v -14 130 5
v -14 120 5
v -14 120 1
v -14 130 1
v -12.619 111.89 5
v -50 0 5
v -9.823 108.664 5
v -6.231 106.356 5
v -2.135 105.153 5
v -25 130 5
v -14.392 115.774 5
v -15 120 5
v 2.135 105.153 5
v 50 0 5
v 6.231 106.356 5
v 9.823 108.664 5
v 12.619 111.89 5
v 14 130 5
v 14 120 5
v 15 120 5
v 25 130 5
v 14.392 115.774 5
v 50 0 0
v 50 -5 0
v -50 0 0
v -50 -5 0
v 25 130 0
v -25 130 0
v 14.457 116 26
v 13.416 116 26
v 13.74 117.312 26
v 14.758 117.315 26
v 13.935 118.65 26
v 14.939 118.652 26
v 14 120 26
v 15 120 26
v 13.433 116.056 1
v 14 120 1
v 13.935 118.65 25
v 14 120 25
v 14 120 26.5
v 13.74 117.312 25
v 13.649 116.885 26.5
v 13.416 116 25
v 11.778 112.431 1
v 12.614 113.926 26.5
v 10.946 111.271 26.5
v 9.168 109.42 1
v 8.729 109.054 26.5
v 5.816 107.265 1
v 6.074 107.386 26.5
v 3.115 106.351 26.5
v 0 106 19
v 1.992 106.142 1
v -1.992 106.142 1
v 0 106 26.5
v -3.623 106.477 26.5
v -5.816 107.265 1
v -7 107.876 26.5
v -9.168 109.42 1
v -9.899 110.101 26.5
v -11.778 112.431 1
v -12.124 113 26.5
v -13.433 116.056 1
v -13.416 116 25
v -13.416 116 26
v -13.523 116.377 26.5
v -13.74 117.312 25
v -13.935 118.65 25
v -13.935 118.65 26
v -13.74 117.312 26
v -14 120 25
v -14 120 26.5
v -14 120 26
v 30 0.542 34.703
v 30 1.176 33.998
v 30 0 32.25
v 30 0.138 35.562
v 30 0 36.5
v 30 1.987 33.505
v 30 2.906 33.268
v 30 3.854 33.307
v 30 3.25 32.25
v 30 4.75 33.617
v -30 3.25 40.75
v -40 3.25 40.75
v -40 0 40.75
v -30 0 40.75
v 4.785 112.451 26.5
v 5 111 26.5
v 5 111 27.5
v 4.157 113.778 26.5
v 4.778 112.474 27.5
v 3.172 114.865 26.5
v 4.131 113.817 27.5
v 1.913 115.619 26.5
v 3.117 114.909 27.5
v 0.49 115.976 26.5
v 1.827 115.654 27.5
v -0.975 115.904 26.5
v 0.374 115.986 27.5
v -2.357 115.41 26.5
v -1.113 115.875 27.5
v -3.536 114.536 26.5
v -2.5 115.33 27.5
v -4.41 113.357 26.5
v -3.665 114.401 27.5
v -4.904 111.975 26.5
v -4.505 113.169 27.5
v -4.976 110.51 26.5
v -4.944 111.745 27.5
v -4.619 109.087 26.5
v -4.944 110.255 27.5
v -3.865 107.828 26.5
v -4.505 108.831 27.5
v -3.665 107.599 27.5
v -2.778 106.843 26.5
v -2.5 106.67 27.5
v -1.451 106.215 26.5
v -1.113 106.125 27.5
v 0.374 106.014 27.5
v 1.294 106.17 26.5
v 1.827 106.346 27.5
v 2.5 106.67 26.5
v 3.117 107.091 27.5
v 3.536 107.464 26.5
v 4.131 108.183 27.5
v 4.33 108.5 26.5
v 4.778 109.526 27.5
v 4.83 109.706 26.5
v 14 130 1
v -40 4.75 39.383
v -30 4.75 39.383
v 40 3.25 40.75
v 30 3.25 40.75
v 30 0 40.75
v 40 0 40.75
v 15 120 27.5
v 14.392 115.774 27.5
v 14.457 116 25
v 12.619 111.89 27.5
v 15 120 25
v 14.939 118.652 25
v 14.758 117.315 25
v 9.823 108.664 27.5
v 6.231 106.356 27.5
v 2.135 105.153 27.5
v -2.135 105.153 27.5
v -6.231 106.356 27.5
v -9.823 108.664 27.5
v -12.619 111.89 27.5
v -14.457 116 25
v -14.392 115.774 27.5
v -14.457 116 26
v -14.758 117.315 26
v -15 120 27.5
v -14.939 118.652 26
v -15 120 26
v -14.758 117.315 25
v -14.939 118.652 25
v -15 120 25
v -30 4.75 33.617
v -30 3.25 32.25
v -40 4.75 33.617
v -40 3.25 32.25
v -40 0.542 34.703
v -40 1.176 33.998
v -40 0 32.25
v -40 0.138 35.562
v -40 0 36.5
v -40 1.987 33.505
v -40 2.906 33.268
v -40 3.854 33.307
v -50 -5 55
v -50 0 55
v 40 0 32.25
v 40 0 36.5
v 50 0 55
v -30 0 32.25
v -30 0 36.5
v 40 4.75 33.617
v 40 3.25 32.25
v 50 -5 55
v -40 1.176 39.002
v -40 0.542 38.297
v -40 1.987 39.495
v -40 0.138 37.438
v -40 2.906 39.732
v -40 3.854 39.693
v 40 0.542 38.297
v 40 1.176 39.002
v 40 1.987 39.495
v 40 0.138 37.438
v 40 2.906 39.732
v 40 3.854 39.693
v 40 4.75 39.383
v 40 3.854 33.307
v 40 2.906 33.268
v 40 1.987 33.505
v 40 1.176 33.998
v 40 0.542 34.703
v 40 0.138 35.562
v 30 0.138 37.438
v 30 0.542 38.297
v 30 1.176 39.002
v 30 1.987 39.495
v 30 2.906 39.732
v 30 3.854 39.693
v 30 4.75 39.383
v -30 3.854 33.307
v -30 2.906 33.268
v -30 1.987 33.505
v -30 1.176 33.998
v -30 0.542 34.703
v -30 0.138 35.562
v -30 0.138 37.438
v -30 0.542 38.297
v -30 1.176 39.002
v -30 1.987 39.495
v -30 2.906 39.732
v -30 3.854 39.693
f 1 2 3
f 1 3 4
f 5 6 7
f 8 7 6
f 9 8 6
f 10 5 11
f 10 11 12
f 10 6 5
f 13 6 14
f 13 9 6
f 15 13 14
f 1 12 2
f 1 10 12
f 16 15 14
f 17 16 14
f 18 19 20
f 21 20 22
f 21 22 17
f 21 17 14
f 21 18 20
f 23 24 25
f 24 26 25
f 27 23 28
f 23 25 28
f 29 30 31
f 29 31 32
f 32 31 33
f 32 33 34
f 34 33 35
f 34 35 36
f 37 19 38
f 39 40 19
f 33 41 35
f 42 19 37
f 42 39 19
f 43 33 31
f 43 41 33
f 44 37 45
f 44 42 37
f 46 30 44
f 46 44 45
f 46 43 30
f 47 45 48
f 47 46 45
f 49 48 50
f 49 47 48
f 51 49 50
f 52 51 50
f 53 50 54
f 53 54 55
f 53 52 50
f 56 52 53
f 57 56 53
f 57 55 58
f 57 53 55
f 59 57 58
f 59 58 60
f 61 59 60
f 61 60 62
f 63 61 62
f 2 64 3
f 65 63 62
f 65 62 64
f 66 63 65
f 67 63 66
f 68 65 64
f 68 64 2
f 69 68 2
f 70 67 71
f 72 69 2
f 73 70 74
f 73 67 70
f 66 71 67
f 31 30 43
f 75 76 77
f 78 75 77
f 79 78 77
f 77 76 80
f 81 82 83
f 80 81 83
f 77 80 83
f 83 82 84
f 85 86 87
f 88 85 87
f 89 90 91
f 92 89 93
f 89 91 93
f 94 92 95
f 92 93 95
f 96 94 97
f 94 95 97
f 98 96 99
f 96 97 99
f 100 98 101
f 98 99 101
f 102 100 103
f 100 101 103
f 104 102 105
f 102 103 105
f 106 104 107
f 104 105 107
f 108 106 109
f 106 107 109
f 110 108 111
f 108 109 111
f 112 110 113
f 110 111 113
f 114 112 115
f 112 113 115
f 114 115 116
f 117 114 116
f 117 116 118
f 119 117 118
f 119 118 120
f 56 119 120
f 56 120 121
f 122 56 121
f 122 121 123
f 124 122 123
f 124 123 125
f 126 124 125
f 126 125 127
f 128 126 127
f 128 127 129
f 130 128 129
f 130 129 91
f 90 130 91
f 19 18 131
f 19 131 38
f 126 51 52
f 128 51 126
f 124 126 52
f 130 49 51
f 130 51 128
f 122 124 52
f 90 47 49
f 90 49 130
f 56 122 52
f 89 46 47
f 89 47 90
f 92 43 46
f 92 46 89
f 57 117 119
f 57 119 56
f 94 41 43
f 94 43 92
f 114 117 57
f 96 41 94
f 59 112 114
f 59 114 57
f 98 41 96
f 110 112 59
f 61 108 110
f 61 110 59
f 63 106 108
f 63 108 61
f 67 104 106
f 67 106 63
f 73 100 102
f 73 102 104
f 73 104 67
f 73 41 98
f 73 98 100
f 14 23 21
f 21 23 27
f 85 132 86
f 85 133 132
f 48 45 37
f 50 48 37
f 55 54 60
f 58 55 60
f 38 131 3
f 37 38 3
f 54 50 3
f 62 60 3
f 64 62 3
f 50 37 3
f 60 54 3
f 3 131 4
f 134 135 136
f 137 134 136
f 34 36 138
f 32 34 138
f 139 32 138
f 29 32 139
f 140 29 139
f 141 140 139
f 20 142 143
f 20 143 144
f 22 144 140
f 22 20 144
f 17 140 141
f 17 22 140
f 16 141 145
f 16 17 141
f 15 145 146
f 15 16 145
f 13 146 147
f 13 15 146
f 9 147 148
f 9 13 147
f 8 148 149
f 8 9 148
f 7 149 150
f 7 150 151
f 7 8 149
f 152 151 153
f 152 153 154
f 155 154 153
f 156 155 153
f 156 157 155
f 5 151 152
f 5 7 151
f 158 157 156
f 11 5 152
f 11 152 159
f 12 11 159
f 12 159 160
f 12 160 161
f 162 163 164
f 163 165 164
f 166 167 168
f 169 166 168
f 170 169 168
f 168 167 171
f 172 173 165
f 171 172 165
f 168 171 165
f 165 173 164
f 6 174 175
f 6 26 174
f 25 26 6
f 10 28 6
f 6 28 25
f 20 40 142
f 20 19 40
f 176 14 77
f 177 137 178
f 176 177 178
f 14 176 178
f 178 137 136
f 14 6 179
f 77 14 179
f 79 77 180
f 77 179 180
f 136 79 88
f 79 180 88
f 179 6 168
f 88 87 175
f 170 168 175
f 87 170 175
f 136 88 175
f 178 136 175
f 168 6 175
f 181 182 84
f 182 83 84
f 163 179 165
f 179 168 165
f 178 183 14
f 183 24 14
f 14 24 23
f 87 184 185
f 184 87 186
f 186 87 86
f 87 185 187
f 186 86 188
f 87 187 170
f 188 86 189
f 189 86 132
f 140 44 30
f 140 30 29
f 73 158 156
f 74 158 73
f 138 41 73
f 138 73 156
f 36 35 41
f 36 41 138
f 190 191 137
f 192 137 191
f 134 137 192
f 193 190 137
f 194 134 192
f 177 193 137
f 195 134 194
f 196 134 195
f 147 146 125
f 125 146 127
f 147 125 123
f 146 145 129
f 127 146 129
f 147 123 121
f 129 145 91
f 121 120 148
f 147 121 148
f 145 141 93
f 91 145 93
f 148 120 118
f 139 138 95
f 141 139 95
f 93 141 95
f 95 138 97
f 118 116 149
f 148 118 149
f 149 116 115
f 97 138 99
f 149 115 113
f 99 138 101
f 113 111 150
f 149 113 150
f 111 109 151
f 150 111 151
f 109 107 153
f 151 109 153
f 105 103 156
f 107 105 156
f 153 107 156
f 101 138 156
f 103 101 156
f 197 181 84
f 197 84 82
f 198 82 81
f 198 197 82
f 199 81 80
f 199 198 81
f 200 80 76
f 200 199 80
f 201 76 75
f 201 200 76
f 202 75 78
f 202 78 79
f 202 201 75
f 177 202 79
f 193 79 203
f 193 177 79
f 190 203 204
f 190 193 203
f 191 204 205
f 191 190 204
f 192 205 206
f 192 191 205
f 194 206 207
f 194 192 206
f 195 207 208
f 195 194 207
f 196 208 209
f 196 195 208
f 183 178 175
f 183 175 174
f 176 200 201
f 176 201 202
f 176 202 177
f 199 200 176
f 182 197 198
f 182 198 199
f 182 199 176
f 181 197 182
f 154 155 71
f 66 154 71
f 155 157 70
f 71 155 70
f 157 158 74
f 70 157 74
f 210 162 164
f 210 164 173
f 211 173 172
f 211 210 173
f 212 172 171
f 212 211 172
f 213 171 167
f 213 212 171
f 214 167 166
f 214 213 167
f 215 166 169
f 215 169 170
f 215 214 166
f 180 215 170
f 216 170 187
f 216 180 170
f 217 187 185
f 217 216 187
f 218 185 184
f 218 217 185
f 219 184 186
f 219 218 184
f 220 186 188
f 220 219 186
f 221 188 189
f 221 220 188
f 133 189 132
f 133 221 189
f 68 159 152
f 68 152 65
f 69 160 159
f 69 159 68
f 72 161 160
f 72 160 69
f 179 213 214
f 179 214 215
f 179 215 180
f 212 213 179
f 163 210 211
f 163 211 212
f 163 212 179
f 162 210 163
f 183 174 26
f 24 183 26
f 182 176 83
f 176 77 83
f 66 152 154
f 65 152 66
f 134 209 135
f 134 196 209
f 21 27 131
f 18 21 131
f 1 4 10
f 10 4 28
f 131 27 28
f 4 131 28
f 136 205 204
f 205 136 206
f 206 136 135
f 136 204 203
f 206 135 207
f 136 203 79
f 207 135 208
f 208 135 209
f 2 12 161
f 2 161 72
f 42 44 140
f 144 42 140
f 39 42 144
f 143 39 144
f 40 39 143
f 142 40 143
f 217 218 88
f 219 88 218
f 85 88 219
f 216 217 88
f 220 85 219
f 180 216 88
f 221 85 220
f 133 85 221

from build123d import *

# Parameters (mm, degrees)
BOSS_EXTRUDE1_DEPTH      = 5
BOSS_EXTRUDE3_DEPTH      = 22.5
CUT_EXTRUDE3_DEPTH       = 21.5
CUT_EXTRUDE3_DEPTH_BACK  = 4
SKETCH2_W                = 100
SKETCH2_H                = 5
BOSS_EXTRUDE2_DEPTH      = 50
SKETCH4_R                = 5
CUT_EXTRUDE1_DEPTH       = 8.5
SKETCH5_W                = 41.64031781
SKETCH5_H                = 1
CUT_EXTRUDE2_DEPTH       = 4
BOSS_EXTRUDE5_DEPTH      = 5
BOSS_EXTRUDE5_DEPTH_BACK = 5
BOSS_EXTRUDE6_DEPTH      = 5
BOSS_EXTRUDE6_DEPTH_BACK = 5


with BuildPart() as part:
    # Sketch1 → Boss-Extrude1 (new body)
    with BuildSketch(Plane.XY):
        Polygon((25, 130), (-25, 130), (-50, 0), (-50, -5), (50, -5), (50, 0), align=None)
    extrude(amount=BOSS_EXTRUDE1_DEPTH)

    # Sketch3 → Boss-Extrude3 (add)
    with BuildSketch(Plane.XY.offset(5)):
        with BuildLine():
            Line((-15, 120), (15, 120))
            ThreePointArc((15, 120), (0, 105), (-15, 120))
        make_face()
    extrude(amount=BOSS_EXTRUDE3_DEPTH)

    # Sketch12 → Cut-Extrude3 (cut, two sides)
    with BuildSketch(Plane.XY.offset(5)) as cut_extrude3_sk:
        with BuildLine():
            Line((-14, 120), (-14, 130))
            Line((-14, 130), (14, 130))
            Line((14, 130), (14, 120))
            ThreePointArc((14, 120), (0, 106), (-14, 120))
        make_face()
    extrude(amount=CUT_EXTRUDE3_DEPTH, mode=Mode.SUBTRACT)
    extrude(cut_extrude3_sk.sketch, amount=-CUT_EXTRUDE3_DEPTH_BACK, mode=Mode.SUBTRACT)

    # Sketch2 → Boss-Extrude2 (add)
    with BuildSketch(Plane.XY.offset(5)):
        with Locations((0, -2.5)):
            Rectangle(SKETCH2_W, SKETCH2_H)
    extrude(amount=BOSS_EXTRUDE2_DEPTH)

    # Sketch4 → Cut-Extrude1 (cut)
    with BuildSketch(Plane.XY.offset(27.5)):
        with Locations((0, 111)):
            Circle(SKETCH4_R)
    extrude(amount=-CUT_EXTRUDE1_DEPTH, mode=Mode.SUBTRACT)

    # Sketch5 → Cut-Extrude2 (cut)
    with BuildSketch(Plane(origin=(0, 120, 0), x_dir=(1, 0, 0), z_dir=(0, 1, 0))):
        with Locations((0.627254623, -25.5)):
            Rectangle(SKETCH5_W, SKETCH5_H)
    extrude(amount=-CUT_EXTRUDE2_DEPTH, mode=Mode.SUBTRACT)

    # Sketch8 → Boss-Extrude5 (add, two sides)
    with BuildSketch(Plane(origin=(-35, 0, 0), x_dir=(0, 0, -1), z_dir=(1, 0, 0))) as boss_extrude5_sk:
        with BuildLine():
            Line((-40.75, 3.25), (-40.75, 0))
            Line((-40.75, 0), (-55, 0))
            Line((-55, 0), (-55, -5))
            Line((-55, -5), (0, -5))
            Line((0, -5), (0, 0))
            Line((0, 0), (-5, 0))
            Line((-5, 0), (-32.25, 0))
            Line((-32.25, 0), (-32.25, 3.25))
            Line((-32.25, 3.25), (-33.616859351, 4.75))
            ThreePointArc((-33.616859351, 4.75), (-36.5, 0), (-39.383140649, 4.75))
            Line((-39.383140649, 4.75), (-40.75, 3.25))
        make_face()
    extrude(amount=BOSS_EXTRUDE5_DEPTH)
    extrude(boss_extrude5_sk.sketch, amount=-BOSS_EXTRUDE5_DEPTH_BACK)

    # Sketch11 → Boss-Extrude6 (add, two sides)
    with BuildSketch(Plane(origin=(35, 0, 0), x_dir=(0, 0, -1), z_dir=(1, 0, 0))) as boss_extrude6_sk:
        with BuildLine():
            Line((-40.75, 3.25), (-40.75, 0))
            Line((-40.75, 0), (-55, 0))
            Line((-55, 0), (-55, -5))
            Line((-55, -5), (0, -5))
            Line((0, -5), (0, 0))
            Line((0, 0), (-5, 0))
            Line((-5, 0), (-32.25, 0))
            Line((-32.25, 0), (-32.25, 3.25))
            Line((-32.25, 3.25), (-33.616859351, 4.75))
            ThreePointArc((-33.616859351, 4.75), (-36.5, 0), (-39.383140649, 4.75))
            Line((-39.383140649, 4.75), (-40.75, 3.25))
        make_face()
    extrude(amount=BOSS_EXTRUDE6_DEPTH)
    extrude(boss_extrude6_sk.sketch, amount=-BOSS_EXTRUDE6_DEPTH_BACK)


solid = part.part
